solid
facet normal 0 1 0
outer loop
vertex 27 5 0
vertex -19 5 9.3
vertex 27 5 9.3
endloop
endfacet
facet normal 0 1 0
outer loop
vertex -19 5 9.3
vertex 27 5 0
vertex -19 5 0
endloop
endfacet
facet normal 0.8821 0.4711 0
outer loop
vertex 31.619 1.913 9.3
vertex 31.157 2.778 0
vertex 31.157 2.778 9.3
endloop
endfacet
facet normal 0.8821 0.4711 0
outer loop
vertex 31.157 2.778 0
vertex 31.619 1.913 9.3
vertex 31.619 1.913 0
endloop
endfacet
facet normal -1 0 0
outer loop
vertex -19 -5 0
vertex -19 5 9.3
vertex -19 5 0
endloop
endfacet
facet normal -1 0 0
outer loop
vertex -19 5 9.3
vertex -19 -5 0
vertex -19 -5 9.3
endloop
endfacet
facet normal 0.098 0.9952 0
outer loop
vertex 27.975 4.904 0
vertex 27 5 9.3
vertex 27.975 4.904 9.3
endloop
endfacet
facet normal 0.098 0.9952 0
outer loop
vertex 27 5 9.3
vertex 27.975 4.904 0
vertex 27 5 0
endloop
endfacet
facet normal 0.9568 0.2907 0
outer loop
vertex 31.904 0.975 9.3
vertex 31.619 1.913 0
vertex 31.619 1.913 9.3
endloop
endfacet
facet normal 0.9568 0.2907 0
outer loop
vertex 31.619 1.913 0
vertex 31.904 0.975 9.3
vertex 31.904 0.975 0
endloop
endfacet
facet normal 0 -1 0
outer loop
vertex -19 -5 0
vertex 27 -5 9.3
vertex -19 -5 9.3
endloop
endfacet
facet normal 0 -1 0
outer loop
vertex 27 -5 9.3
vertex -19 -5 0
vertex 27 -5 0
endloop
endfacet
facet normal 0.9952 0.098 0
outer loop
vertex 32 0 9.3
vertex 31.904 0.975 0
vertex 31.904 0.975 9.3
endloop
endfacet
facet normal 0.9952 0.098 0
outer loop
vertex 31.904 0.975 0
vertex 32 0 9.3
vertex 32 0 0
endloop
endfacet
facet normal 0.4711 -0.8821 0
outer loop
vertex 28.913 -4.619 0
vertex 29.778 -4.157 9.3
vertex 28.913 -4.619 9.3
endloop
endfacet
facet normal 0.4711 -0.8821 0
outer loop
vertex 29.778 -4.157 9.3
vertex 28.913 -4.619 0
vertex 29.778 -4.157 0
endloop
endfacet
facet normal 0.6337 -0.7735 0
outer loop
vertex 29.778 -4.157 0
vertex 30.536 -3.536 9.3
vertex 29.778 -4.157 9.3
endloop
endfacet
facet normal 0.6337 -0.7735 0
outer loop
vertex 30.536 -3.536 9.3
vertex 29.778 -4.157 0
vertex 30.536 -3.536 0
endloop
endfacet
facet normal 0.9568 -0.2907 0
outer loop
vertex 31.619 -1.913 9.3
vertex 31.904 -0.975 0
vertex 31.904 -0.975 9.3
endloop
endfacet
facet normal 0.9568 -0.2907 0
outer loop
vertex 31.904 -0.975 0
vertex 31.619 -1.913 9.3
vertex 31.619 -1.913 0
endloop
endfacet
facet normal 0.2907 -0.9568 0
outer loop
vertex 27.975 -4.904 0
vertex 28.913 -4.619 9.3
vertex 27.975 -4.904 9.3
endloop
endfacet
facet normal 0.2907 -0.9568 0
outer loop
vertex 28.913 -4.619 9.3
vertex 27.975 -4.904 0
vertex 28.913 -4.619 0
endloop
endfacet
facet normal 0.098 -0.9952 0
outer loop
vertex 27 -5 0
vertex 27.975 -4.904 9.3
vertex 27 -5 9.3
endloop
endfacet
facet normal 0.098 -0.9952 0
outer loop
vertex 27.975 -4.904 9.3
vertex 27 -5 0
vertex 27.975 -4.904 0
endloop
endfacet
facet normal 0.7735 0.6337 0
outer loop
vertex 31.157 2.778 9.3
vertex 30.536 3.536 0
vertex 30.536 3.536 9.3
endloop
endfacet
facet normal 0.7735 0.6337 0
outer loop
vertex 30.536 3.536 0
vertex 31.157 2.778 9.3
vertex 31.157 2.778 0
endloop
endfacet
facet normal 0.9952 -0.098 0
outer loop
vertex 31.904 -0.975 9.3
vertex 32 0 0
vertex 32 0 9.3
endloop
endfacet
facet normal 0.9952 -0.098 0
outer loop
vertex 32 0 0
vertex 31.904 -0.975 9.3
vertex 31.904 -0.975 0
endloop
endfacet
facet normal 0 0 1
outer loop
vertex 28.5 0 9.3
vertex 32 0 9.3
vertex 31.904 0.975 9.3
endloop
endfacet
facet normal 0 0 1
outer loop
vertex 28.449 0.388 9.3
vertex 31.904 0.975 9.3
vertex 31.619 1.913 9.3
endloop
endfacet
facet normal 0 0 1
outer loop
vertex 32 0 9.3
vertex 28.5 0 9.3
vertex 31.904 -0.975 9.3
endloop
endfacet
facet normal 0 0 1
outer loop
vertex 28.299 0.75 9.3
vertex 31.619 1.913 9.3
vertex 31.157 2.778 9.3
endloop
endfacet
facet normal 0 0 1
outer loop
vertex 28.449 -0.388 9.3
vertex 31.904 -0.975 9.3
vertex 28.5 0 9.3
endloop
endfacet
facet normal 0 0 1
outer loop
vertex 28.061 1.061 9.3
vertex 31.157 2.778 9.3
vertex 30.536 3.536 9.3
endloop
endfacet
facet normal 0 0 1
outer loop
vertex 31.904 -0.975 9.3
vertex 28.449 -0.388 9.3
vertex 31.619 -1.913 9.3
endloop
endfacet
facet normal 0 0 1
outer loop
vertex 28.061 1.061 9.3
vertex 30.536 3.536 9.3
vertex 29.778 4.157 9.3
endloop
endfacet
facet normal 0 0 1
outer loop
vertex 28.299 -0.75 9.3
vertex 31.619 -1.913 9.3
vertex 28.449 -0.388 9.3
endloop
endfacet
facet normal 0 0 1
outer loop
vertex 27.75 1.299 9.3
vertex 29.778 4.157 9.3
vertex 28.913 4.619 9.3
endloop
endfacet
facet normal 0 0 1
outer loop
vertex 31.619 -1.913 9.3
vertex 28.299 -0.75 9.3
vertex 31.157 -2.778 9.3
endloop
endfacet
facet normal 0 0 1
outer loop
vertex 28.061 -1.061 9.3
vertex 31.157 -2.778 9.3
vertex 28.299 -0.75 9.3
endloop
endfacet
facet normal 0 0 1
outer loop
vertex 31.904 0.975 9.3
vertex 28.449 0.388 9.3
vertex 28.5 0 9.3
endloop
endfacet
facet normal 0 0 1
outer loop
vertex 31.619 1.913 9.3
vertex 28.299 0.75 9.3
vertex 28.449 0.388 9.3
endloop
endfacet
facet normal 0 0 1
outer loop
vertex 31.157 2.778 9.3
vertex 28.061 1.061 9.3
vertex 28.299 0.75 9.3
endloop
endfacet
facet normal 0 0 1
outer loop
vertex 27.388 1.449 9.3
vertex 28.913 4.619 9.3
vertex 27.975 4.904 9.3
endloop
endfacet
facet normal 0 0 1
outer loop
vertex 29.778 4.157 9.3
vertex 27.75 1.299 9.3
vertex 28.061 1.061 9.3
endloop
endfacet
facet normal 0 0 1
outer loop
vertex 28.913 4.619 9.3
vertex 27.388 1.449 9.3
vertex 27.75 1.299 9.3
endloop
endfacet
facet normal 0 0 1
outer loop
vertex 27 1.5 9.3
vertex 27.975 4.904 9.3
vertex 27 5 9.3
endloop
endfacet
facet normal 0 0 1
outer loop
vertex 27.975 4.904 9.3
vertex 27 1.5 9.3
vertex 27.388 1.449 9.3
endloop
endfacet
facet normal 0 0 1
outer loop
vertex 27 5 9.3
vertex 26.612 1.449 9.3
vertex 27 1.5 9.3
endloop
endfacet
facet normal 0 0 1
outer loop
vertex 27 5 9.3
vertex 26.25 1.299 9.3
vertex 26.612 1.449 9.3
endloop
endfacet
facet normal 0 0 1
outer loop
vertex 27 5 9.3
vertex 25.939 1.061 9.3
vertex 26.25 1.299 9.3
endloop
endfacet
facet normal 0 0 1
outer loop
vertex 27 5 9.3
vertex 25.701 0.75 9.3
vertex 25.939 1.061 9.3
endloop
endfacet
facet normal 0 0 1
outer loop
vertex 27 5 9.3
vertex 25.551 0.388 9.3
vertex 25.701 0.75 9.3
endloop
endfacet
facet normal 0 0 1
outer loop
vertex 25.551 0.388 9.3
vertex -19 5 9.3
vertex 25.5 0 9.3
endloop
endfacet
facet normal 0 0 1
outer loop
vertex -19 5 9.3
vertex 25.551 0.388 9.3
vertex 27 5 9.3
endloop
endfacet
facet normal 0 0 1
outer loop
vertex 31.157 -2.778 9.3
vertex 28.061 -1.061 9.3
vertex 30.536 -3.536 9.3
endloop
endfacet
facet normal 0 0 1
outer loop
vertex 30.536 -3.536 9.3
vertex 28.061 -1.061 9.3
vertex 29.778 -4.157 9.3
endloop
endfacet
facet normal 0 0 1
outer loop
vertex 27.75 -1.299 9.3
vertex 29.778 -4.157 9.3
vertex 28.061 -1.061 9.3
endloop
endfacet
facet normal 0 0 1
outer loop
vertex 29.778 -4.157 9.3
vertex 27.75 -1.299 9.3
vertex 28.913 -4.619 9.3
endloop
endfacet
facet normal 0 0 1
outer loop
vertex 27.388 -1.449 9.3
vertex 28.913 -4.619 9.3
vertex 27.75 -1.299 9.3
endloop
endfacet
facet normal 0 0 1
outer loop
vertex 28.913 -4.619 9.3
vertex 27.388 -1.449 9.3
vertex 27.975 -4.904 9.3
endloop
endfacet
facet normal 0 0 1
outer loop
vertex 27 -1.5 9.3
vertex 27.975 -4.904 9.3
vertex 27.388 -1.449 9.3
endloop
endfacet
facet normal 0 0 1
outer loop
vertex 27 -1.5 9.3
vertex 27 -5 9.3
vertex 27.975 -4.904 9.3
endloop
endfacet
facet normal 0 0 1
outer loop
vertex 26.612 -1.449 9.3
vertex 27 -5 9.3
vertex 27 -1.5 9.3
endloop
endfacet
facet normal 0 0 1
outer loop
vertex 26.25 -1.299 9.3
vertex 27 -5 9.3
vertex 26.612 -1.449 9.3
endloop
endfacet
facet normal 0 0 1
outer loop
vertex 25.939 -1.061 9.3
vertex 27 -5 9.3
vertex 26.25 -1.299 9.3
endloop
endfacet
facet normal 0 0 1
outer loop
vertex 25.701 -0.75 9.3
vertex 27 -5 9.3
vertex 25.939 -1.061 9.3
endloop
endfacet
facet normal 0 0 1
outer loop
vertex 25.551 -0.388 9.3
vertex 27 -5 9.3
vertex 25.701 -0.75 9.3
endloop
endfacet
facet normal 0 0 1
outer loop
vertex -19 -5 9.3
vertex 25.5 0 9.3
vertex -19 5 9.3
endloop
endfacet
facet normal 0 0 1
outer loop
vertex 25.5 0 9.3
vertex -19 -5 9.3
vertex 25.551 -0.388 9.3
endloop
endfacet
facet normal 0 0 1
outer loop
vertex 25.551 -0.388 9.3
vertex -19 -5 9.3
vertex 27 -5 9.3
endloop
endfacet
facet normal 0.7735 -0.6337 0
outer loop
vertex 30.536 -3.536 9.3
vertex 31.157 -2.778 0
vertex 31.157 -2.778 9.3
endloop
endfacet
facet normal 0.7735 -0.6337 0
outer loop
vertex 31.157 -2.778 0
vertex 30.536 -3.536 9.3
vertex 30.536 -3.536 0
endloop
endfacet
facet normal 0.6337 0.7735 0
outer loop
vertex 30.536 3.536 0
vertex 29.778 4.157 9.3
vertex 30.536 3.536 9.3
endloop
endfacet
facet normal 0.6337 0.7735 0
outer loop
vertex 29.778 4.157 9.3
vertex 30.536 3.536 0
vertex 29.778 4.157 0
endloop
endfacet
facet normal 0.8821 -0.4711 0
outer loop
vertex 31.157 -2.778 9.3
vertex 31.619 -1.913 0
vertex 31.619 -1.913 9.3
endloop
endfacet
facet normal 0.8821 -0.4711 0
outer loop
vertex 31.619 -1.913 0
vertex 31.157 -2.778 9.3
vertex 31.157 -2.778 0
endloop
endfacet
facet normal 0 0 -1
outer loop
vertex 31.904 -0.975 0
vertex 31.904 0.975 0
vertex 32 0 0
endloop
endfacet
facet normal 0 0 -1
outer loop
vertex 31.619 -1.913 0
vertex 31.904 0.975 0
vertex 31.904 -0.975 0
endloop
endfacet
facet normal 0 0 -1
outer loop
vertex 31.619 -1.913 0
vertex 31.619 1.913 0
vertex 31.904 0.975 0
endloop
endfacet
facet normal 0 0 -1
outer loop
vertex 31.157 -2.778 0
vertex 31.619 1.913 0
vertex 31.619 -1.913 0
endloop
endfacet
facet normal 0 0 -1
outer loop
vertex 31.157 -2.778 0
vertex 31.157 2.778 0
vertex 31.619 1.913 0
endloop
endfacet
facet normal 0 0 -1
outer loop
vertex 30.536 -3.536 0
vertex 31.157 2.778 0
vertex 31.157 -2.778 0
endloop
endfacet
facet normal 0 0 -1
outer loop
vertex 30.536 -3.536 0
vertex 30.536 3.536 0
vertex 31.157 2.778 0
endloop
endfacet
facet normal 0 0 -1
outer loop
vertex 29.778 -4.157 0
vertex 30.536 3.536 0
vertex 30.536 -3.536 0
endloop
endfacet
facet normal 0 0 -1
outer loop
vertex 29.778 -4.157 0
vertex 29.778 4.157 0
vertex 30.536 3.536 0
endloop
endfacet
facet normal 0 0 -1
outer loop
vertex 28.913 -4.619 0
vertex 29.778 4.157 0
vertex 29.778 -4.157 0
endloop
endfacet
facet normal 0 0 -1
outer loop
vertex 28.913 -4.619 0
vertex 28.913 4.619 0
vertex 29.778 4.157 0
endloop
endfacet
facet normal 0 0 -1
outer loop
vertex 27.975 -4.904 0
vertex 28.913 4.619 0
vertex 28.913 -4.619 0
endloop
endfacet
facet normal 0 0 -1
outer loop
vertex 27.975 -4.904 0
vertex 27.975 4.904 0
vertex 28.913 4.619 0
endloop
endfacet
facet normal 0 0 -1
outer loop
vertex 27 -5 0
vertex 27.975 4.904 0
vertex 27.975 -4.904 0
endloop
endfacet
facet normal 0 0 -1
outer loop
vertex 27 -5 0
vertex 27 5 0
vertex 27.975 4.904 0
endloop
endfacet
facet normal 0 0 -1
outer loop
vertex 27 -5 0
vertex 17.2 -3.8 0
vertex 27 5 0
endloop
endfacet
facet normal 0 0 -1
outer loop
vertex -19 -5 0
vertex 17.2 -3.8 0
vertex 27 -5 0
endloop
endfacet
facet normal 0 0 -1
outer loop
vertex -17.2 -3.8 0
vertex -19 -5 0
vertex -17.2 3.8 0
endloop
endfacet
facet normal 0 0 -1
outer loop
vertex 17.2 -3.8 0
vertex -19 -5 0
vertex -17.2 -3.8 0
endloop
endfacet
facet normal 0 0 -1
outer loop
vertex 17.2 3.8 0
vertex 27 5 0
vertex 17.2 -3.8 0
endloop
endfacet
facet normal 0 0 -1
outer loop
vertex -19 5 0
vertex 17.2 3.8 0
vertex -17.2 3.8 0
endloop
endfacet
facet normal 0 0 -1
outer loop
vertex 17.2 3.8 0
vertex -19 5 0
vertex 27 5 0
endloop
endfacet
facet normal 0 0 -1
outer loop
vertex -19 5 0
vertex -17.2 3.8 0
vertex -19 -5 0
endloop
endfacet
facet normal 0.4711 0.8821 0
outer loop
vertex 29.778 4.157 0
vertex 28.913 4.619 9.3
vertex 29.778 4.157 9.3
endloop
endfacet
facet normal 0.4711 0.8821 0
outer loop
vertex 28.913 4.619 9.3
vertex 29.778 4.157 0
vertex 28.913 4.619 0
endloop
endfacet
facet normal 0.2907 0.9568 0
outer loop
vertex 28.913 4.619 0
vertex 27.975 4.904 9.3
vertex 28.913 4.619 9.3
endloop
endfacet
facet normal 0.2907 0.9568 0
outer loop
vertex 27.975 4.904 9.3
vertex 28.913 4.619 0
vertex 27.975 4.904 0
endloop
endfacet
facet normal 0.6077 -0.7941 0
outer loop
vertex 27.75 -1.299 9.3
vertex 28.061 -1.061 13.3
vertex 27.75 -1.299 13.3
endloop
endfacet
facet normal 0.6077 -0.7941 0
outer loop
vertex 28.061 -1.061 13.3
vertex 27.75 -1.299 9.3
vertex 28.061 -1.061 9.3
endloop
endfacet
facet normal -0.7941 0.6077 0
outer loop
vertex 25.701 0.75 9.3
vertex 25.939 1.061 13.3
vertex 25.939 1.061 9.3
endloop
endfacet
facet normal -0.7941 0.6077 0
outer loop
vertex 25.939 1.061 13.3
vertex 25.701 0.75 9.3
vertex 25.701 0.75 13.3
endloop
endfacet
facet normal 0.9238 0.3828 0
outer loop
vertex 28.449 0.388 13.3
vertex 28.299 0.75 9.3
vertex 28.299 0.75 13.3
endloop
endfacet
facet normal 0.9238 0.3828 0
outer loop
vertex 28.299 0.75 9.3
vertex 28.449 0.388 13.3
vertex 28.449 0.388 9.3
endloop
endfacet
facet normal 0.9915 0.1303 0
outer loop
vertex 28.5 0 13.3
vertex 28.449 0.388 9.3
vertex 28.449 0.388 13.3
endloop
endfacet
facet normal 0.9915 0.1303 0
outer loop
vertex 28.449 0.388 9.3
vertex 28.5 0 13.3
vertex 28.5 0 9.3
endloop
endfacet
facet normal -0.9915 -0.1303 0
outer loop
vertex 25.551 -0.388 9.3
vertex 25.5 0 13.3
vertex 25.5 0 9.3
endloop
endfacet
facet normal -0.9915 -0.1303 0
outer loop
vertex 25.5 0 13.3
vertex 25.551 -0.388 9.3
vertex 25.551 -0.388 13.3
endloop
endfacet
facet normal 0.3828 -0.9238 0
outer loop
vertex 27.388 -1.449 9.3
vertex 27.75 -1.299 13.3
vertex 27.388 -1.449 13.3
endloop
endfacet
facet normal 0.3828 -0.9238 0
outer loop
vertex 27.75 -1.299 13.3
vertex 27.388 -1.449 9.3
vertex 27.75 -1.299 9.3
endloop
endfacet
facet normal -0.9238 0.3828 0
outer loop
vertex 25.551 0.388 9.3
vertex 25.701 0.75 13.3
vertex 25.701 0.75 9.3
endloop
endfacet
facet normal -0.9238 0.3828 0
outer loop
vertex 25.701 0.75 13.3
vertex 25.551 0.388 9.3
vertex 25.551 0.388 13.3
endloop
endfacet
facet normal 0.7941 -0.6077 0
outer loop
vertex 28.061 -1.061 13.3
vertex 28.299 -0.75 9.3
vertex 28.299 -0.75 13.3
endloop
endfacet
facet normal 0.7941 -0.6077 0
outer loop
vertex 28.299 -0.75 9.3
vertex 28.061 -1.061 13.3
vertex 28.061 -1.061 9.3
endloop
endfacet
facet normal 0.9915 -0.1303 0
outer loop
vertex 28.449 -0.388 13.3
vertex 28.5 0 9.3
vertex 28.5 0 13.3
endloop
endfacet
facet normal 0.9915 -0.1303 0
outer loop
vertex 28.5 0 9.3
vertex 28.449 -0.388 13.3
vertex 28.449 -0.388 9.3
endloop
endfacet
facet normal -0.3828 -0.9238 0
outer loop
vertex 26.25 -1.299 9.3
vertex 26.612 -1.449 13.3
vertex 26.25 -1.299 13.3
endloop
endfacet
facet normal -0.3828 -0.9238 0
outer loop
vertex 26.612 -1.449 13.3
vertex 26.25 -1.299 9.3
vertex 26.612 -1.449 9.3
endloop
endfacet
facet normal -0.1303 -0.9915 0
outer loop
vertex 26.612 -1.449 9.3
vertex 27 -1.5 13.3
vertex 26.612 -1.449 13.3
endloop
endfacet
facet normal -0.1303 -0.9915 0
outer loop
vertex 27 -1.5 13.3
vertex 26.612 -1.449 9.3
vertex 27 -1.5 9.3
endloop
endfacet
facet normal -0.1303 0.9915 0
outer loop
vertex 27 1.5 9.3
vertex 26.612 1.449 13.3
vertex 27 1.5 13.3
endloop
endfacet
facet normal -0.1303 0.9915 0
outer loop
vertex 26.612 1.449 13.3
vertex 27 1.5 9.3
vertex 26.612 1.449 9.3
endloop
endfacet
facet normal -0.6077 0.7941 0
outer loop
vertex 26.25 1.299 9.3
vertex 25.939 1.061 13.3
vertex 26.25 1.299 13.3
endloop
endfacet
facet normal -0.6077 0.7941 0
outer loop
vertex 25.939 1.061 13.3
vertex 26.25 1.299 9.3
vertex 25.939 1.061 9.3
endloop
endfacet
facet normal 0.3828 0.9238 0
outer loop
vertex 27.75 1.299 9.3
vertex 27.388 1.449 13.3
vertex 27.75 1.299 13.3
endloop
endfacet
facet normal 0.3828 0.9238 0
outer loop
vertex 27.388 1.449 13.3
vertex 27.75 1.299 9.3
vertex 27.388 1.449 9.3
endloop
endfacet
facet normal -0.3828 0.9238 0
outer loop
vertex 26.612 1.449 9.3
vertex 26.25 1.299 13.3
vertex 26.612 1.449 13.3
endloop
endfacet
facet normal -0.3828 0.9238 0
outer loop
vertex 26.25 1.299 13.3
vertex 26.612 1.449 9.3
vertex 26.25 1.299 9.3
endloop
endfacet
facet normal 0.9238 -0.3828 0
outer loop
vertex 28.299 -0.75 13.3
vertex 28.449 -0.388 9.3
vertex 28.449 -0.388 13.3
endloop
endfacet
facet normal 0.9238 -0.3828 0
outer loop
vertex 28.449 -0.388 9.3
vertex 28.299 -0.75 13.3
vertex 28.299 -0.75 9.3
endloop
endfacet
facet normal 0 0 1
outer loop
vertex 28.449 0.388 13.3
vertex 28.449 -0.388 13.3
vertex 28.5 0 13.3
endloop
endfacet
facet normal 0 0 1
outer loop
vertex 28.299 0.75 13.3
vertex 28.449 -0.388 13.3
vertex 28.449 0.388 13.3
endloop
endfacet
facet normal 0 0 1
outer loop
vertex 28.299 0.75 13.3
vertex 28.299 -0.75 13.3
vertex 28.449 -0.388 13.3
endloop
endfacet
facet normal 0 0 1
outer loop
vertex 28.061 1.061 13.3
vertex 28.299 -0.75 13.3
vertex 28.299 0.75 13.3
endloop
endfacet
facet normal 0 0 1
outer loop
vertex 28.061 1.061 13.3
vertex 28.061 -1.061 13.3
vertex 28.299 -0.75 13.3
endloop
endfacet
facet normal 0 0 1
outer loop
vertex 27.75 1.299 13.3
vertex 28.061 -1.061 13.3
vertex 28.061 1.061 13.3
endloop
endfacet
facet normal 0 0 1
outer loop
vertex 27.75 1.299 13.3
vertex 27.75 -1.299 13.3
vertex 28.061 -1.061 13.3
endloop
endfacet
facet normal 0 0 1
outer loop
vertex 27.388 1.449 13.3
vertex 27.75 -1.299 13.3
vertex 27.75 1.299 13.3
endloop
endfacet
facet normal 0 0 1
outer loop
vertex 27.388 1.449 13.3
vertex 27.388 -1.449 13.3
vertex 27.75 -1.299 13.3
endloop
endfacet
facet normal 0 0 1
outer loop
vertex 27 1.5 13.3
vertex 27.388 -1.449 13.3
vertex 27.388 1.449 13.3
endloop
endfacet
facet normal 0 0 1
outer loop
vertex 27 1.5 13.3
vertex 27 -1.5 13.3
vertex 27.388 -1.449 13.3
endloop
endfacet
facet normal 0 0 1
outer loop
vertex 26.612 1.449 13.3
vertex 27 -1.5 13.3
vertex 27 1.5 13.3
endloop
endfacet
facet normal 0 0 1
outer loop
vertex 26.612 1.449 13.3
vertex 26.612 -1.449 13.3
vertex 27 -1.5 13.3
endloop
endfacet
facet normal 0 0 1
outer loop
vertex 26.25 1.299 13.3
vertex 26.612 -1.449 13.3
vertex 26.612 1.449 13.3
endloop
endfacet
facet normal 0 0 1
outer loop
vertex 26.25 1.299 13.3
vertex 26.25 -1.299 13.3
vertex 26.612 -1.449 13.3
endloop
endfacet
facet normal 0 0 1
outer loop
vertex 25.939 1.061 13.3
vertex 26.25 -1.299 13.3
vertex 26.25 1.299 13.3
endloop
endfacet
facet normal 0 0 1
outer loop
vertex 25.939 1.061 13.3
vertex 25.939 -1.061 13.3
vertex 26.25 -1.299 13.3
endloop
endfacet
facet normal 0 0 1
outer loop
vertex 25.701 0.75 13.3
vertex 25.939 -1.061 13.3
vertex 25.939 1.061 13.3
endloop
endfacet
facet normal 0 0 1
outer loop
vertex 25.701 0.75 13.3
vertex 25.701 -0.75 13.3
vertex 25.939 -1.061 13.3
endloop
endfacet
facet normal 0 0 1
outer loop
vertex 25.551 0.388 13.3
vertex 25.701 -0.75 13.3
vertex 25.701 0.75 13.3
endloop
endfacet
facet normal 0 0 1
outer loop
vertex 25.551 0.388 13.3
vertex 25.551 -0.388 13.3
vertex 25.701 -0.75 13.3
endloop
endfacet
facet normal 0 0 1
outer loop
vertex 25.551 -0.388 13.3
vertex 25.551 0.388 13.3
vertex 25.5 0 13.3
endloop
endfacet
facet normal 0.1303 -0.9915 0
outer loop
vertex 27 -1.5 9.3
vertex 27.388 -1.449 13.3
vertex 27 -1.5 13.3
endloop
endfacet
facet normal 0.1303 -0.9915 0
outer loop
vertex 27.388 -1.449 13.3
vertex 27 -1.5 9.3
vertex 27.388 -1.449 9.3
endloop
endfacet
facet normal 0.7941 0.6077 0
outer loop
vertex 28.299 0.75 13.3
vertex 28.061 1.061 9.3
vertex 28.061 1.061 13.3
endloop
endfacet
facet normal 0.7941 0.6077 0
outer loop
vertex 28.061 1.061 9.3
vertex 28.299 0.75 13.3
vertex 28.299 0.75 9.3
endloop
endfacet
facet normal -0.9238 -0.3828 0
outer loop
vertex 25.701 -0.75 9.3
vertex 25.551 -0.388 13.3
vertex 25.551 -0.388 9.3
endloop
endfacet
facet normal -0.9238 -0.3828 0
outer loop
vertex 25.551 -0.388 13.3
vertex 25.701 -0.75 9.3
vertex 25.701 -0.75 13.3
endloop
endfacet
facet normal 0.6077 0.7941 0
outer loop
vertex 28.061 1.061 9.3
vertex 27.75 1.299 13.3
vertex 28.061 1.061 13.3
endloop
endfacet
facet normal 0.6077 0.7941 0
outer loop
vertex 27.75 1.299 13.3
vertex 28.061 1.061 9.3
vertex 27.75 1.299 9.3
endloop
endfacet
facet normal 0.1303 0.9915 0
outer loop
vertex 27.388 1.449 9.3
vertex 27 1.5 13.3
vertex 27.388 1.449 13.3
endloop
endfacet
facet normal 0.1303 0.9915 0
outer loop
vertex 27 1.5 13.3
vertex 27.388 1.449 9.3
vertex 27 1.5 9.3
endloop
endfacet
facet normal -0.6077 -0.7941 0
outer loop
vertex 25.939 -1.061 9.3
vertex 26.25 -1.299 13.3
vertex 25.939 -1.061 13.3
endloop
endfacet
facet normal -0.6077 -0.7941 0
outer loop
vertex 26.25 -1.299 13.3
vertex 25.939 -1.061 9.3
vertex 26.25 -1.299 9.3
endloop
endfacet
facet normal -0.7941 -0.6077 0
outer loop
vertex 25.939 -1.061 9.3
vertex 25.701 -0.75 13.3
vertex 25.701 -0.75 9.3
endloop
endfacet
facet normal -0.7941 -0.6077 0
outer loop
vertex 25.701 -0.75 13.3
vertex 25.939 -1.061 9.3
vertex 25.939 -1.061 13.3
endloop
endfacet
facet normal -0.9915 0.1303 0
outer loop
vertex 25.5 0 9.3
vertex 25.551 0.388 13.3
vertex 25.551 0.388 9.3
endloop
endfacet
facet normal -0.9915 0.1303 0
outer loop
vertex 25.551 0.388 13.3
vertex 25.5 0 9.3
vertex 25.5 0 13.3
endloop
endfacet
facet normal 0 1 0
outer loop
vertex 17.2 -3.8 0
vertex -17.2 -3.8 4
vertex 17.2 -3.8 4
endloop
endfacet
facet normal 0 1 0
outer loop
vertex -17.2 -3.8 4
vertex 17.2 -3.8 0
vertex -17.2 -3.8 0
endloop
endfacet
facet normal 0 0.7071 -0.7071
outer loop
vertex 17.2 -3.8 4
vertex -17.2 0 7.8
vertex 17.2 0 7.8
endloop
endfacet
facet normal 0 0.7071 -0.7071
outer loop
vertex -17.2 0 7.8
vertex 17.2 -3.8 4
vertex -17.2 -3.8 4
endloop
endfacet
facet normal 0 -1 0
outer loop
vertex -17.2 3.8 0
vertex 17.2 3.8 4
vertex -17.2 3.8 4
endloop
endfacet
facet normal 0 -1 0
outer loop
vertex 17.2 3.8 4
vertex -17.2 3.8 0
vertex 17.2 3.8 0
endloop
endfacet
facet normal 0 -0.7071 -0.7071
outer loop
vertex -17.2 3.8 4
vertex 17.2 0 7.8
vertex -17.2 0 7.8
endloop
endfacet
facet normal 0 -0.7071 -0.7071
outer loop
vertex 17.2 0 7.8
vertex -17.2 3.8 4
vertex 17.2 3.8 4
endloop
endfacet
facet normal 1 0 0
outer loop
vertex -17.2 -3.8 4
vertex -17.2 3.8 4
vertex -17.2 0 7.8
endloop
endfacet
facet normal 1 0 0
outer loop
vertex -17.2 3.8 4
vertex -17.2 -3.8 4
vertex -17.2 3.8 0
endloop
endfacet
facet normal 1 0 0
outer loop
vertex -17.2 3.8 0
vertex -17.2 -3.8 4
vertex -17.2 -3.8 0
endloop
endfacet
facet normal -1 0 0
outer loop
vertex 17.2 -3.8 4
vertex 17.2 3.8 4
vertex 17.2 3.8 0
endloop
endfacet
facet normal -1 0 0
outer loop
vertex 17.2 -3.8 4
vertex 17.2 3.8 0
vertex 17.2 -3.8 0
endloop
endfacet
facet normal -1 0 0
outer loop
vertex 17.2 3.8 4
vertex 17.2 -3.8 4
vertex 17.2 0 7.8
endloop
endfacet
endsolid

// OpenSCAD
include <../lib/servo-duct-manifold-lib.scad>;
$fn = 96;
iris_arm();
